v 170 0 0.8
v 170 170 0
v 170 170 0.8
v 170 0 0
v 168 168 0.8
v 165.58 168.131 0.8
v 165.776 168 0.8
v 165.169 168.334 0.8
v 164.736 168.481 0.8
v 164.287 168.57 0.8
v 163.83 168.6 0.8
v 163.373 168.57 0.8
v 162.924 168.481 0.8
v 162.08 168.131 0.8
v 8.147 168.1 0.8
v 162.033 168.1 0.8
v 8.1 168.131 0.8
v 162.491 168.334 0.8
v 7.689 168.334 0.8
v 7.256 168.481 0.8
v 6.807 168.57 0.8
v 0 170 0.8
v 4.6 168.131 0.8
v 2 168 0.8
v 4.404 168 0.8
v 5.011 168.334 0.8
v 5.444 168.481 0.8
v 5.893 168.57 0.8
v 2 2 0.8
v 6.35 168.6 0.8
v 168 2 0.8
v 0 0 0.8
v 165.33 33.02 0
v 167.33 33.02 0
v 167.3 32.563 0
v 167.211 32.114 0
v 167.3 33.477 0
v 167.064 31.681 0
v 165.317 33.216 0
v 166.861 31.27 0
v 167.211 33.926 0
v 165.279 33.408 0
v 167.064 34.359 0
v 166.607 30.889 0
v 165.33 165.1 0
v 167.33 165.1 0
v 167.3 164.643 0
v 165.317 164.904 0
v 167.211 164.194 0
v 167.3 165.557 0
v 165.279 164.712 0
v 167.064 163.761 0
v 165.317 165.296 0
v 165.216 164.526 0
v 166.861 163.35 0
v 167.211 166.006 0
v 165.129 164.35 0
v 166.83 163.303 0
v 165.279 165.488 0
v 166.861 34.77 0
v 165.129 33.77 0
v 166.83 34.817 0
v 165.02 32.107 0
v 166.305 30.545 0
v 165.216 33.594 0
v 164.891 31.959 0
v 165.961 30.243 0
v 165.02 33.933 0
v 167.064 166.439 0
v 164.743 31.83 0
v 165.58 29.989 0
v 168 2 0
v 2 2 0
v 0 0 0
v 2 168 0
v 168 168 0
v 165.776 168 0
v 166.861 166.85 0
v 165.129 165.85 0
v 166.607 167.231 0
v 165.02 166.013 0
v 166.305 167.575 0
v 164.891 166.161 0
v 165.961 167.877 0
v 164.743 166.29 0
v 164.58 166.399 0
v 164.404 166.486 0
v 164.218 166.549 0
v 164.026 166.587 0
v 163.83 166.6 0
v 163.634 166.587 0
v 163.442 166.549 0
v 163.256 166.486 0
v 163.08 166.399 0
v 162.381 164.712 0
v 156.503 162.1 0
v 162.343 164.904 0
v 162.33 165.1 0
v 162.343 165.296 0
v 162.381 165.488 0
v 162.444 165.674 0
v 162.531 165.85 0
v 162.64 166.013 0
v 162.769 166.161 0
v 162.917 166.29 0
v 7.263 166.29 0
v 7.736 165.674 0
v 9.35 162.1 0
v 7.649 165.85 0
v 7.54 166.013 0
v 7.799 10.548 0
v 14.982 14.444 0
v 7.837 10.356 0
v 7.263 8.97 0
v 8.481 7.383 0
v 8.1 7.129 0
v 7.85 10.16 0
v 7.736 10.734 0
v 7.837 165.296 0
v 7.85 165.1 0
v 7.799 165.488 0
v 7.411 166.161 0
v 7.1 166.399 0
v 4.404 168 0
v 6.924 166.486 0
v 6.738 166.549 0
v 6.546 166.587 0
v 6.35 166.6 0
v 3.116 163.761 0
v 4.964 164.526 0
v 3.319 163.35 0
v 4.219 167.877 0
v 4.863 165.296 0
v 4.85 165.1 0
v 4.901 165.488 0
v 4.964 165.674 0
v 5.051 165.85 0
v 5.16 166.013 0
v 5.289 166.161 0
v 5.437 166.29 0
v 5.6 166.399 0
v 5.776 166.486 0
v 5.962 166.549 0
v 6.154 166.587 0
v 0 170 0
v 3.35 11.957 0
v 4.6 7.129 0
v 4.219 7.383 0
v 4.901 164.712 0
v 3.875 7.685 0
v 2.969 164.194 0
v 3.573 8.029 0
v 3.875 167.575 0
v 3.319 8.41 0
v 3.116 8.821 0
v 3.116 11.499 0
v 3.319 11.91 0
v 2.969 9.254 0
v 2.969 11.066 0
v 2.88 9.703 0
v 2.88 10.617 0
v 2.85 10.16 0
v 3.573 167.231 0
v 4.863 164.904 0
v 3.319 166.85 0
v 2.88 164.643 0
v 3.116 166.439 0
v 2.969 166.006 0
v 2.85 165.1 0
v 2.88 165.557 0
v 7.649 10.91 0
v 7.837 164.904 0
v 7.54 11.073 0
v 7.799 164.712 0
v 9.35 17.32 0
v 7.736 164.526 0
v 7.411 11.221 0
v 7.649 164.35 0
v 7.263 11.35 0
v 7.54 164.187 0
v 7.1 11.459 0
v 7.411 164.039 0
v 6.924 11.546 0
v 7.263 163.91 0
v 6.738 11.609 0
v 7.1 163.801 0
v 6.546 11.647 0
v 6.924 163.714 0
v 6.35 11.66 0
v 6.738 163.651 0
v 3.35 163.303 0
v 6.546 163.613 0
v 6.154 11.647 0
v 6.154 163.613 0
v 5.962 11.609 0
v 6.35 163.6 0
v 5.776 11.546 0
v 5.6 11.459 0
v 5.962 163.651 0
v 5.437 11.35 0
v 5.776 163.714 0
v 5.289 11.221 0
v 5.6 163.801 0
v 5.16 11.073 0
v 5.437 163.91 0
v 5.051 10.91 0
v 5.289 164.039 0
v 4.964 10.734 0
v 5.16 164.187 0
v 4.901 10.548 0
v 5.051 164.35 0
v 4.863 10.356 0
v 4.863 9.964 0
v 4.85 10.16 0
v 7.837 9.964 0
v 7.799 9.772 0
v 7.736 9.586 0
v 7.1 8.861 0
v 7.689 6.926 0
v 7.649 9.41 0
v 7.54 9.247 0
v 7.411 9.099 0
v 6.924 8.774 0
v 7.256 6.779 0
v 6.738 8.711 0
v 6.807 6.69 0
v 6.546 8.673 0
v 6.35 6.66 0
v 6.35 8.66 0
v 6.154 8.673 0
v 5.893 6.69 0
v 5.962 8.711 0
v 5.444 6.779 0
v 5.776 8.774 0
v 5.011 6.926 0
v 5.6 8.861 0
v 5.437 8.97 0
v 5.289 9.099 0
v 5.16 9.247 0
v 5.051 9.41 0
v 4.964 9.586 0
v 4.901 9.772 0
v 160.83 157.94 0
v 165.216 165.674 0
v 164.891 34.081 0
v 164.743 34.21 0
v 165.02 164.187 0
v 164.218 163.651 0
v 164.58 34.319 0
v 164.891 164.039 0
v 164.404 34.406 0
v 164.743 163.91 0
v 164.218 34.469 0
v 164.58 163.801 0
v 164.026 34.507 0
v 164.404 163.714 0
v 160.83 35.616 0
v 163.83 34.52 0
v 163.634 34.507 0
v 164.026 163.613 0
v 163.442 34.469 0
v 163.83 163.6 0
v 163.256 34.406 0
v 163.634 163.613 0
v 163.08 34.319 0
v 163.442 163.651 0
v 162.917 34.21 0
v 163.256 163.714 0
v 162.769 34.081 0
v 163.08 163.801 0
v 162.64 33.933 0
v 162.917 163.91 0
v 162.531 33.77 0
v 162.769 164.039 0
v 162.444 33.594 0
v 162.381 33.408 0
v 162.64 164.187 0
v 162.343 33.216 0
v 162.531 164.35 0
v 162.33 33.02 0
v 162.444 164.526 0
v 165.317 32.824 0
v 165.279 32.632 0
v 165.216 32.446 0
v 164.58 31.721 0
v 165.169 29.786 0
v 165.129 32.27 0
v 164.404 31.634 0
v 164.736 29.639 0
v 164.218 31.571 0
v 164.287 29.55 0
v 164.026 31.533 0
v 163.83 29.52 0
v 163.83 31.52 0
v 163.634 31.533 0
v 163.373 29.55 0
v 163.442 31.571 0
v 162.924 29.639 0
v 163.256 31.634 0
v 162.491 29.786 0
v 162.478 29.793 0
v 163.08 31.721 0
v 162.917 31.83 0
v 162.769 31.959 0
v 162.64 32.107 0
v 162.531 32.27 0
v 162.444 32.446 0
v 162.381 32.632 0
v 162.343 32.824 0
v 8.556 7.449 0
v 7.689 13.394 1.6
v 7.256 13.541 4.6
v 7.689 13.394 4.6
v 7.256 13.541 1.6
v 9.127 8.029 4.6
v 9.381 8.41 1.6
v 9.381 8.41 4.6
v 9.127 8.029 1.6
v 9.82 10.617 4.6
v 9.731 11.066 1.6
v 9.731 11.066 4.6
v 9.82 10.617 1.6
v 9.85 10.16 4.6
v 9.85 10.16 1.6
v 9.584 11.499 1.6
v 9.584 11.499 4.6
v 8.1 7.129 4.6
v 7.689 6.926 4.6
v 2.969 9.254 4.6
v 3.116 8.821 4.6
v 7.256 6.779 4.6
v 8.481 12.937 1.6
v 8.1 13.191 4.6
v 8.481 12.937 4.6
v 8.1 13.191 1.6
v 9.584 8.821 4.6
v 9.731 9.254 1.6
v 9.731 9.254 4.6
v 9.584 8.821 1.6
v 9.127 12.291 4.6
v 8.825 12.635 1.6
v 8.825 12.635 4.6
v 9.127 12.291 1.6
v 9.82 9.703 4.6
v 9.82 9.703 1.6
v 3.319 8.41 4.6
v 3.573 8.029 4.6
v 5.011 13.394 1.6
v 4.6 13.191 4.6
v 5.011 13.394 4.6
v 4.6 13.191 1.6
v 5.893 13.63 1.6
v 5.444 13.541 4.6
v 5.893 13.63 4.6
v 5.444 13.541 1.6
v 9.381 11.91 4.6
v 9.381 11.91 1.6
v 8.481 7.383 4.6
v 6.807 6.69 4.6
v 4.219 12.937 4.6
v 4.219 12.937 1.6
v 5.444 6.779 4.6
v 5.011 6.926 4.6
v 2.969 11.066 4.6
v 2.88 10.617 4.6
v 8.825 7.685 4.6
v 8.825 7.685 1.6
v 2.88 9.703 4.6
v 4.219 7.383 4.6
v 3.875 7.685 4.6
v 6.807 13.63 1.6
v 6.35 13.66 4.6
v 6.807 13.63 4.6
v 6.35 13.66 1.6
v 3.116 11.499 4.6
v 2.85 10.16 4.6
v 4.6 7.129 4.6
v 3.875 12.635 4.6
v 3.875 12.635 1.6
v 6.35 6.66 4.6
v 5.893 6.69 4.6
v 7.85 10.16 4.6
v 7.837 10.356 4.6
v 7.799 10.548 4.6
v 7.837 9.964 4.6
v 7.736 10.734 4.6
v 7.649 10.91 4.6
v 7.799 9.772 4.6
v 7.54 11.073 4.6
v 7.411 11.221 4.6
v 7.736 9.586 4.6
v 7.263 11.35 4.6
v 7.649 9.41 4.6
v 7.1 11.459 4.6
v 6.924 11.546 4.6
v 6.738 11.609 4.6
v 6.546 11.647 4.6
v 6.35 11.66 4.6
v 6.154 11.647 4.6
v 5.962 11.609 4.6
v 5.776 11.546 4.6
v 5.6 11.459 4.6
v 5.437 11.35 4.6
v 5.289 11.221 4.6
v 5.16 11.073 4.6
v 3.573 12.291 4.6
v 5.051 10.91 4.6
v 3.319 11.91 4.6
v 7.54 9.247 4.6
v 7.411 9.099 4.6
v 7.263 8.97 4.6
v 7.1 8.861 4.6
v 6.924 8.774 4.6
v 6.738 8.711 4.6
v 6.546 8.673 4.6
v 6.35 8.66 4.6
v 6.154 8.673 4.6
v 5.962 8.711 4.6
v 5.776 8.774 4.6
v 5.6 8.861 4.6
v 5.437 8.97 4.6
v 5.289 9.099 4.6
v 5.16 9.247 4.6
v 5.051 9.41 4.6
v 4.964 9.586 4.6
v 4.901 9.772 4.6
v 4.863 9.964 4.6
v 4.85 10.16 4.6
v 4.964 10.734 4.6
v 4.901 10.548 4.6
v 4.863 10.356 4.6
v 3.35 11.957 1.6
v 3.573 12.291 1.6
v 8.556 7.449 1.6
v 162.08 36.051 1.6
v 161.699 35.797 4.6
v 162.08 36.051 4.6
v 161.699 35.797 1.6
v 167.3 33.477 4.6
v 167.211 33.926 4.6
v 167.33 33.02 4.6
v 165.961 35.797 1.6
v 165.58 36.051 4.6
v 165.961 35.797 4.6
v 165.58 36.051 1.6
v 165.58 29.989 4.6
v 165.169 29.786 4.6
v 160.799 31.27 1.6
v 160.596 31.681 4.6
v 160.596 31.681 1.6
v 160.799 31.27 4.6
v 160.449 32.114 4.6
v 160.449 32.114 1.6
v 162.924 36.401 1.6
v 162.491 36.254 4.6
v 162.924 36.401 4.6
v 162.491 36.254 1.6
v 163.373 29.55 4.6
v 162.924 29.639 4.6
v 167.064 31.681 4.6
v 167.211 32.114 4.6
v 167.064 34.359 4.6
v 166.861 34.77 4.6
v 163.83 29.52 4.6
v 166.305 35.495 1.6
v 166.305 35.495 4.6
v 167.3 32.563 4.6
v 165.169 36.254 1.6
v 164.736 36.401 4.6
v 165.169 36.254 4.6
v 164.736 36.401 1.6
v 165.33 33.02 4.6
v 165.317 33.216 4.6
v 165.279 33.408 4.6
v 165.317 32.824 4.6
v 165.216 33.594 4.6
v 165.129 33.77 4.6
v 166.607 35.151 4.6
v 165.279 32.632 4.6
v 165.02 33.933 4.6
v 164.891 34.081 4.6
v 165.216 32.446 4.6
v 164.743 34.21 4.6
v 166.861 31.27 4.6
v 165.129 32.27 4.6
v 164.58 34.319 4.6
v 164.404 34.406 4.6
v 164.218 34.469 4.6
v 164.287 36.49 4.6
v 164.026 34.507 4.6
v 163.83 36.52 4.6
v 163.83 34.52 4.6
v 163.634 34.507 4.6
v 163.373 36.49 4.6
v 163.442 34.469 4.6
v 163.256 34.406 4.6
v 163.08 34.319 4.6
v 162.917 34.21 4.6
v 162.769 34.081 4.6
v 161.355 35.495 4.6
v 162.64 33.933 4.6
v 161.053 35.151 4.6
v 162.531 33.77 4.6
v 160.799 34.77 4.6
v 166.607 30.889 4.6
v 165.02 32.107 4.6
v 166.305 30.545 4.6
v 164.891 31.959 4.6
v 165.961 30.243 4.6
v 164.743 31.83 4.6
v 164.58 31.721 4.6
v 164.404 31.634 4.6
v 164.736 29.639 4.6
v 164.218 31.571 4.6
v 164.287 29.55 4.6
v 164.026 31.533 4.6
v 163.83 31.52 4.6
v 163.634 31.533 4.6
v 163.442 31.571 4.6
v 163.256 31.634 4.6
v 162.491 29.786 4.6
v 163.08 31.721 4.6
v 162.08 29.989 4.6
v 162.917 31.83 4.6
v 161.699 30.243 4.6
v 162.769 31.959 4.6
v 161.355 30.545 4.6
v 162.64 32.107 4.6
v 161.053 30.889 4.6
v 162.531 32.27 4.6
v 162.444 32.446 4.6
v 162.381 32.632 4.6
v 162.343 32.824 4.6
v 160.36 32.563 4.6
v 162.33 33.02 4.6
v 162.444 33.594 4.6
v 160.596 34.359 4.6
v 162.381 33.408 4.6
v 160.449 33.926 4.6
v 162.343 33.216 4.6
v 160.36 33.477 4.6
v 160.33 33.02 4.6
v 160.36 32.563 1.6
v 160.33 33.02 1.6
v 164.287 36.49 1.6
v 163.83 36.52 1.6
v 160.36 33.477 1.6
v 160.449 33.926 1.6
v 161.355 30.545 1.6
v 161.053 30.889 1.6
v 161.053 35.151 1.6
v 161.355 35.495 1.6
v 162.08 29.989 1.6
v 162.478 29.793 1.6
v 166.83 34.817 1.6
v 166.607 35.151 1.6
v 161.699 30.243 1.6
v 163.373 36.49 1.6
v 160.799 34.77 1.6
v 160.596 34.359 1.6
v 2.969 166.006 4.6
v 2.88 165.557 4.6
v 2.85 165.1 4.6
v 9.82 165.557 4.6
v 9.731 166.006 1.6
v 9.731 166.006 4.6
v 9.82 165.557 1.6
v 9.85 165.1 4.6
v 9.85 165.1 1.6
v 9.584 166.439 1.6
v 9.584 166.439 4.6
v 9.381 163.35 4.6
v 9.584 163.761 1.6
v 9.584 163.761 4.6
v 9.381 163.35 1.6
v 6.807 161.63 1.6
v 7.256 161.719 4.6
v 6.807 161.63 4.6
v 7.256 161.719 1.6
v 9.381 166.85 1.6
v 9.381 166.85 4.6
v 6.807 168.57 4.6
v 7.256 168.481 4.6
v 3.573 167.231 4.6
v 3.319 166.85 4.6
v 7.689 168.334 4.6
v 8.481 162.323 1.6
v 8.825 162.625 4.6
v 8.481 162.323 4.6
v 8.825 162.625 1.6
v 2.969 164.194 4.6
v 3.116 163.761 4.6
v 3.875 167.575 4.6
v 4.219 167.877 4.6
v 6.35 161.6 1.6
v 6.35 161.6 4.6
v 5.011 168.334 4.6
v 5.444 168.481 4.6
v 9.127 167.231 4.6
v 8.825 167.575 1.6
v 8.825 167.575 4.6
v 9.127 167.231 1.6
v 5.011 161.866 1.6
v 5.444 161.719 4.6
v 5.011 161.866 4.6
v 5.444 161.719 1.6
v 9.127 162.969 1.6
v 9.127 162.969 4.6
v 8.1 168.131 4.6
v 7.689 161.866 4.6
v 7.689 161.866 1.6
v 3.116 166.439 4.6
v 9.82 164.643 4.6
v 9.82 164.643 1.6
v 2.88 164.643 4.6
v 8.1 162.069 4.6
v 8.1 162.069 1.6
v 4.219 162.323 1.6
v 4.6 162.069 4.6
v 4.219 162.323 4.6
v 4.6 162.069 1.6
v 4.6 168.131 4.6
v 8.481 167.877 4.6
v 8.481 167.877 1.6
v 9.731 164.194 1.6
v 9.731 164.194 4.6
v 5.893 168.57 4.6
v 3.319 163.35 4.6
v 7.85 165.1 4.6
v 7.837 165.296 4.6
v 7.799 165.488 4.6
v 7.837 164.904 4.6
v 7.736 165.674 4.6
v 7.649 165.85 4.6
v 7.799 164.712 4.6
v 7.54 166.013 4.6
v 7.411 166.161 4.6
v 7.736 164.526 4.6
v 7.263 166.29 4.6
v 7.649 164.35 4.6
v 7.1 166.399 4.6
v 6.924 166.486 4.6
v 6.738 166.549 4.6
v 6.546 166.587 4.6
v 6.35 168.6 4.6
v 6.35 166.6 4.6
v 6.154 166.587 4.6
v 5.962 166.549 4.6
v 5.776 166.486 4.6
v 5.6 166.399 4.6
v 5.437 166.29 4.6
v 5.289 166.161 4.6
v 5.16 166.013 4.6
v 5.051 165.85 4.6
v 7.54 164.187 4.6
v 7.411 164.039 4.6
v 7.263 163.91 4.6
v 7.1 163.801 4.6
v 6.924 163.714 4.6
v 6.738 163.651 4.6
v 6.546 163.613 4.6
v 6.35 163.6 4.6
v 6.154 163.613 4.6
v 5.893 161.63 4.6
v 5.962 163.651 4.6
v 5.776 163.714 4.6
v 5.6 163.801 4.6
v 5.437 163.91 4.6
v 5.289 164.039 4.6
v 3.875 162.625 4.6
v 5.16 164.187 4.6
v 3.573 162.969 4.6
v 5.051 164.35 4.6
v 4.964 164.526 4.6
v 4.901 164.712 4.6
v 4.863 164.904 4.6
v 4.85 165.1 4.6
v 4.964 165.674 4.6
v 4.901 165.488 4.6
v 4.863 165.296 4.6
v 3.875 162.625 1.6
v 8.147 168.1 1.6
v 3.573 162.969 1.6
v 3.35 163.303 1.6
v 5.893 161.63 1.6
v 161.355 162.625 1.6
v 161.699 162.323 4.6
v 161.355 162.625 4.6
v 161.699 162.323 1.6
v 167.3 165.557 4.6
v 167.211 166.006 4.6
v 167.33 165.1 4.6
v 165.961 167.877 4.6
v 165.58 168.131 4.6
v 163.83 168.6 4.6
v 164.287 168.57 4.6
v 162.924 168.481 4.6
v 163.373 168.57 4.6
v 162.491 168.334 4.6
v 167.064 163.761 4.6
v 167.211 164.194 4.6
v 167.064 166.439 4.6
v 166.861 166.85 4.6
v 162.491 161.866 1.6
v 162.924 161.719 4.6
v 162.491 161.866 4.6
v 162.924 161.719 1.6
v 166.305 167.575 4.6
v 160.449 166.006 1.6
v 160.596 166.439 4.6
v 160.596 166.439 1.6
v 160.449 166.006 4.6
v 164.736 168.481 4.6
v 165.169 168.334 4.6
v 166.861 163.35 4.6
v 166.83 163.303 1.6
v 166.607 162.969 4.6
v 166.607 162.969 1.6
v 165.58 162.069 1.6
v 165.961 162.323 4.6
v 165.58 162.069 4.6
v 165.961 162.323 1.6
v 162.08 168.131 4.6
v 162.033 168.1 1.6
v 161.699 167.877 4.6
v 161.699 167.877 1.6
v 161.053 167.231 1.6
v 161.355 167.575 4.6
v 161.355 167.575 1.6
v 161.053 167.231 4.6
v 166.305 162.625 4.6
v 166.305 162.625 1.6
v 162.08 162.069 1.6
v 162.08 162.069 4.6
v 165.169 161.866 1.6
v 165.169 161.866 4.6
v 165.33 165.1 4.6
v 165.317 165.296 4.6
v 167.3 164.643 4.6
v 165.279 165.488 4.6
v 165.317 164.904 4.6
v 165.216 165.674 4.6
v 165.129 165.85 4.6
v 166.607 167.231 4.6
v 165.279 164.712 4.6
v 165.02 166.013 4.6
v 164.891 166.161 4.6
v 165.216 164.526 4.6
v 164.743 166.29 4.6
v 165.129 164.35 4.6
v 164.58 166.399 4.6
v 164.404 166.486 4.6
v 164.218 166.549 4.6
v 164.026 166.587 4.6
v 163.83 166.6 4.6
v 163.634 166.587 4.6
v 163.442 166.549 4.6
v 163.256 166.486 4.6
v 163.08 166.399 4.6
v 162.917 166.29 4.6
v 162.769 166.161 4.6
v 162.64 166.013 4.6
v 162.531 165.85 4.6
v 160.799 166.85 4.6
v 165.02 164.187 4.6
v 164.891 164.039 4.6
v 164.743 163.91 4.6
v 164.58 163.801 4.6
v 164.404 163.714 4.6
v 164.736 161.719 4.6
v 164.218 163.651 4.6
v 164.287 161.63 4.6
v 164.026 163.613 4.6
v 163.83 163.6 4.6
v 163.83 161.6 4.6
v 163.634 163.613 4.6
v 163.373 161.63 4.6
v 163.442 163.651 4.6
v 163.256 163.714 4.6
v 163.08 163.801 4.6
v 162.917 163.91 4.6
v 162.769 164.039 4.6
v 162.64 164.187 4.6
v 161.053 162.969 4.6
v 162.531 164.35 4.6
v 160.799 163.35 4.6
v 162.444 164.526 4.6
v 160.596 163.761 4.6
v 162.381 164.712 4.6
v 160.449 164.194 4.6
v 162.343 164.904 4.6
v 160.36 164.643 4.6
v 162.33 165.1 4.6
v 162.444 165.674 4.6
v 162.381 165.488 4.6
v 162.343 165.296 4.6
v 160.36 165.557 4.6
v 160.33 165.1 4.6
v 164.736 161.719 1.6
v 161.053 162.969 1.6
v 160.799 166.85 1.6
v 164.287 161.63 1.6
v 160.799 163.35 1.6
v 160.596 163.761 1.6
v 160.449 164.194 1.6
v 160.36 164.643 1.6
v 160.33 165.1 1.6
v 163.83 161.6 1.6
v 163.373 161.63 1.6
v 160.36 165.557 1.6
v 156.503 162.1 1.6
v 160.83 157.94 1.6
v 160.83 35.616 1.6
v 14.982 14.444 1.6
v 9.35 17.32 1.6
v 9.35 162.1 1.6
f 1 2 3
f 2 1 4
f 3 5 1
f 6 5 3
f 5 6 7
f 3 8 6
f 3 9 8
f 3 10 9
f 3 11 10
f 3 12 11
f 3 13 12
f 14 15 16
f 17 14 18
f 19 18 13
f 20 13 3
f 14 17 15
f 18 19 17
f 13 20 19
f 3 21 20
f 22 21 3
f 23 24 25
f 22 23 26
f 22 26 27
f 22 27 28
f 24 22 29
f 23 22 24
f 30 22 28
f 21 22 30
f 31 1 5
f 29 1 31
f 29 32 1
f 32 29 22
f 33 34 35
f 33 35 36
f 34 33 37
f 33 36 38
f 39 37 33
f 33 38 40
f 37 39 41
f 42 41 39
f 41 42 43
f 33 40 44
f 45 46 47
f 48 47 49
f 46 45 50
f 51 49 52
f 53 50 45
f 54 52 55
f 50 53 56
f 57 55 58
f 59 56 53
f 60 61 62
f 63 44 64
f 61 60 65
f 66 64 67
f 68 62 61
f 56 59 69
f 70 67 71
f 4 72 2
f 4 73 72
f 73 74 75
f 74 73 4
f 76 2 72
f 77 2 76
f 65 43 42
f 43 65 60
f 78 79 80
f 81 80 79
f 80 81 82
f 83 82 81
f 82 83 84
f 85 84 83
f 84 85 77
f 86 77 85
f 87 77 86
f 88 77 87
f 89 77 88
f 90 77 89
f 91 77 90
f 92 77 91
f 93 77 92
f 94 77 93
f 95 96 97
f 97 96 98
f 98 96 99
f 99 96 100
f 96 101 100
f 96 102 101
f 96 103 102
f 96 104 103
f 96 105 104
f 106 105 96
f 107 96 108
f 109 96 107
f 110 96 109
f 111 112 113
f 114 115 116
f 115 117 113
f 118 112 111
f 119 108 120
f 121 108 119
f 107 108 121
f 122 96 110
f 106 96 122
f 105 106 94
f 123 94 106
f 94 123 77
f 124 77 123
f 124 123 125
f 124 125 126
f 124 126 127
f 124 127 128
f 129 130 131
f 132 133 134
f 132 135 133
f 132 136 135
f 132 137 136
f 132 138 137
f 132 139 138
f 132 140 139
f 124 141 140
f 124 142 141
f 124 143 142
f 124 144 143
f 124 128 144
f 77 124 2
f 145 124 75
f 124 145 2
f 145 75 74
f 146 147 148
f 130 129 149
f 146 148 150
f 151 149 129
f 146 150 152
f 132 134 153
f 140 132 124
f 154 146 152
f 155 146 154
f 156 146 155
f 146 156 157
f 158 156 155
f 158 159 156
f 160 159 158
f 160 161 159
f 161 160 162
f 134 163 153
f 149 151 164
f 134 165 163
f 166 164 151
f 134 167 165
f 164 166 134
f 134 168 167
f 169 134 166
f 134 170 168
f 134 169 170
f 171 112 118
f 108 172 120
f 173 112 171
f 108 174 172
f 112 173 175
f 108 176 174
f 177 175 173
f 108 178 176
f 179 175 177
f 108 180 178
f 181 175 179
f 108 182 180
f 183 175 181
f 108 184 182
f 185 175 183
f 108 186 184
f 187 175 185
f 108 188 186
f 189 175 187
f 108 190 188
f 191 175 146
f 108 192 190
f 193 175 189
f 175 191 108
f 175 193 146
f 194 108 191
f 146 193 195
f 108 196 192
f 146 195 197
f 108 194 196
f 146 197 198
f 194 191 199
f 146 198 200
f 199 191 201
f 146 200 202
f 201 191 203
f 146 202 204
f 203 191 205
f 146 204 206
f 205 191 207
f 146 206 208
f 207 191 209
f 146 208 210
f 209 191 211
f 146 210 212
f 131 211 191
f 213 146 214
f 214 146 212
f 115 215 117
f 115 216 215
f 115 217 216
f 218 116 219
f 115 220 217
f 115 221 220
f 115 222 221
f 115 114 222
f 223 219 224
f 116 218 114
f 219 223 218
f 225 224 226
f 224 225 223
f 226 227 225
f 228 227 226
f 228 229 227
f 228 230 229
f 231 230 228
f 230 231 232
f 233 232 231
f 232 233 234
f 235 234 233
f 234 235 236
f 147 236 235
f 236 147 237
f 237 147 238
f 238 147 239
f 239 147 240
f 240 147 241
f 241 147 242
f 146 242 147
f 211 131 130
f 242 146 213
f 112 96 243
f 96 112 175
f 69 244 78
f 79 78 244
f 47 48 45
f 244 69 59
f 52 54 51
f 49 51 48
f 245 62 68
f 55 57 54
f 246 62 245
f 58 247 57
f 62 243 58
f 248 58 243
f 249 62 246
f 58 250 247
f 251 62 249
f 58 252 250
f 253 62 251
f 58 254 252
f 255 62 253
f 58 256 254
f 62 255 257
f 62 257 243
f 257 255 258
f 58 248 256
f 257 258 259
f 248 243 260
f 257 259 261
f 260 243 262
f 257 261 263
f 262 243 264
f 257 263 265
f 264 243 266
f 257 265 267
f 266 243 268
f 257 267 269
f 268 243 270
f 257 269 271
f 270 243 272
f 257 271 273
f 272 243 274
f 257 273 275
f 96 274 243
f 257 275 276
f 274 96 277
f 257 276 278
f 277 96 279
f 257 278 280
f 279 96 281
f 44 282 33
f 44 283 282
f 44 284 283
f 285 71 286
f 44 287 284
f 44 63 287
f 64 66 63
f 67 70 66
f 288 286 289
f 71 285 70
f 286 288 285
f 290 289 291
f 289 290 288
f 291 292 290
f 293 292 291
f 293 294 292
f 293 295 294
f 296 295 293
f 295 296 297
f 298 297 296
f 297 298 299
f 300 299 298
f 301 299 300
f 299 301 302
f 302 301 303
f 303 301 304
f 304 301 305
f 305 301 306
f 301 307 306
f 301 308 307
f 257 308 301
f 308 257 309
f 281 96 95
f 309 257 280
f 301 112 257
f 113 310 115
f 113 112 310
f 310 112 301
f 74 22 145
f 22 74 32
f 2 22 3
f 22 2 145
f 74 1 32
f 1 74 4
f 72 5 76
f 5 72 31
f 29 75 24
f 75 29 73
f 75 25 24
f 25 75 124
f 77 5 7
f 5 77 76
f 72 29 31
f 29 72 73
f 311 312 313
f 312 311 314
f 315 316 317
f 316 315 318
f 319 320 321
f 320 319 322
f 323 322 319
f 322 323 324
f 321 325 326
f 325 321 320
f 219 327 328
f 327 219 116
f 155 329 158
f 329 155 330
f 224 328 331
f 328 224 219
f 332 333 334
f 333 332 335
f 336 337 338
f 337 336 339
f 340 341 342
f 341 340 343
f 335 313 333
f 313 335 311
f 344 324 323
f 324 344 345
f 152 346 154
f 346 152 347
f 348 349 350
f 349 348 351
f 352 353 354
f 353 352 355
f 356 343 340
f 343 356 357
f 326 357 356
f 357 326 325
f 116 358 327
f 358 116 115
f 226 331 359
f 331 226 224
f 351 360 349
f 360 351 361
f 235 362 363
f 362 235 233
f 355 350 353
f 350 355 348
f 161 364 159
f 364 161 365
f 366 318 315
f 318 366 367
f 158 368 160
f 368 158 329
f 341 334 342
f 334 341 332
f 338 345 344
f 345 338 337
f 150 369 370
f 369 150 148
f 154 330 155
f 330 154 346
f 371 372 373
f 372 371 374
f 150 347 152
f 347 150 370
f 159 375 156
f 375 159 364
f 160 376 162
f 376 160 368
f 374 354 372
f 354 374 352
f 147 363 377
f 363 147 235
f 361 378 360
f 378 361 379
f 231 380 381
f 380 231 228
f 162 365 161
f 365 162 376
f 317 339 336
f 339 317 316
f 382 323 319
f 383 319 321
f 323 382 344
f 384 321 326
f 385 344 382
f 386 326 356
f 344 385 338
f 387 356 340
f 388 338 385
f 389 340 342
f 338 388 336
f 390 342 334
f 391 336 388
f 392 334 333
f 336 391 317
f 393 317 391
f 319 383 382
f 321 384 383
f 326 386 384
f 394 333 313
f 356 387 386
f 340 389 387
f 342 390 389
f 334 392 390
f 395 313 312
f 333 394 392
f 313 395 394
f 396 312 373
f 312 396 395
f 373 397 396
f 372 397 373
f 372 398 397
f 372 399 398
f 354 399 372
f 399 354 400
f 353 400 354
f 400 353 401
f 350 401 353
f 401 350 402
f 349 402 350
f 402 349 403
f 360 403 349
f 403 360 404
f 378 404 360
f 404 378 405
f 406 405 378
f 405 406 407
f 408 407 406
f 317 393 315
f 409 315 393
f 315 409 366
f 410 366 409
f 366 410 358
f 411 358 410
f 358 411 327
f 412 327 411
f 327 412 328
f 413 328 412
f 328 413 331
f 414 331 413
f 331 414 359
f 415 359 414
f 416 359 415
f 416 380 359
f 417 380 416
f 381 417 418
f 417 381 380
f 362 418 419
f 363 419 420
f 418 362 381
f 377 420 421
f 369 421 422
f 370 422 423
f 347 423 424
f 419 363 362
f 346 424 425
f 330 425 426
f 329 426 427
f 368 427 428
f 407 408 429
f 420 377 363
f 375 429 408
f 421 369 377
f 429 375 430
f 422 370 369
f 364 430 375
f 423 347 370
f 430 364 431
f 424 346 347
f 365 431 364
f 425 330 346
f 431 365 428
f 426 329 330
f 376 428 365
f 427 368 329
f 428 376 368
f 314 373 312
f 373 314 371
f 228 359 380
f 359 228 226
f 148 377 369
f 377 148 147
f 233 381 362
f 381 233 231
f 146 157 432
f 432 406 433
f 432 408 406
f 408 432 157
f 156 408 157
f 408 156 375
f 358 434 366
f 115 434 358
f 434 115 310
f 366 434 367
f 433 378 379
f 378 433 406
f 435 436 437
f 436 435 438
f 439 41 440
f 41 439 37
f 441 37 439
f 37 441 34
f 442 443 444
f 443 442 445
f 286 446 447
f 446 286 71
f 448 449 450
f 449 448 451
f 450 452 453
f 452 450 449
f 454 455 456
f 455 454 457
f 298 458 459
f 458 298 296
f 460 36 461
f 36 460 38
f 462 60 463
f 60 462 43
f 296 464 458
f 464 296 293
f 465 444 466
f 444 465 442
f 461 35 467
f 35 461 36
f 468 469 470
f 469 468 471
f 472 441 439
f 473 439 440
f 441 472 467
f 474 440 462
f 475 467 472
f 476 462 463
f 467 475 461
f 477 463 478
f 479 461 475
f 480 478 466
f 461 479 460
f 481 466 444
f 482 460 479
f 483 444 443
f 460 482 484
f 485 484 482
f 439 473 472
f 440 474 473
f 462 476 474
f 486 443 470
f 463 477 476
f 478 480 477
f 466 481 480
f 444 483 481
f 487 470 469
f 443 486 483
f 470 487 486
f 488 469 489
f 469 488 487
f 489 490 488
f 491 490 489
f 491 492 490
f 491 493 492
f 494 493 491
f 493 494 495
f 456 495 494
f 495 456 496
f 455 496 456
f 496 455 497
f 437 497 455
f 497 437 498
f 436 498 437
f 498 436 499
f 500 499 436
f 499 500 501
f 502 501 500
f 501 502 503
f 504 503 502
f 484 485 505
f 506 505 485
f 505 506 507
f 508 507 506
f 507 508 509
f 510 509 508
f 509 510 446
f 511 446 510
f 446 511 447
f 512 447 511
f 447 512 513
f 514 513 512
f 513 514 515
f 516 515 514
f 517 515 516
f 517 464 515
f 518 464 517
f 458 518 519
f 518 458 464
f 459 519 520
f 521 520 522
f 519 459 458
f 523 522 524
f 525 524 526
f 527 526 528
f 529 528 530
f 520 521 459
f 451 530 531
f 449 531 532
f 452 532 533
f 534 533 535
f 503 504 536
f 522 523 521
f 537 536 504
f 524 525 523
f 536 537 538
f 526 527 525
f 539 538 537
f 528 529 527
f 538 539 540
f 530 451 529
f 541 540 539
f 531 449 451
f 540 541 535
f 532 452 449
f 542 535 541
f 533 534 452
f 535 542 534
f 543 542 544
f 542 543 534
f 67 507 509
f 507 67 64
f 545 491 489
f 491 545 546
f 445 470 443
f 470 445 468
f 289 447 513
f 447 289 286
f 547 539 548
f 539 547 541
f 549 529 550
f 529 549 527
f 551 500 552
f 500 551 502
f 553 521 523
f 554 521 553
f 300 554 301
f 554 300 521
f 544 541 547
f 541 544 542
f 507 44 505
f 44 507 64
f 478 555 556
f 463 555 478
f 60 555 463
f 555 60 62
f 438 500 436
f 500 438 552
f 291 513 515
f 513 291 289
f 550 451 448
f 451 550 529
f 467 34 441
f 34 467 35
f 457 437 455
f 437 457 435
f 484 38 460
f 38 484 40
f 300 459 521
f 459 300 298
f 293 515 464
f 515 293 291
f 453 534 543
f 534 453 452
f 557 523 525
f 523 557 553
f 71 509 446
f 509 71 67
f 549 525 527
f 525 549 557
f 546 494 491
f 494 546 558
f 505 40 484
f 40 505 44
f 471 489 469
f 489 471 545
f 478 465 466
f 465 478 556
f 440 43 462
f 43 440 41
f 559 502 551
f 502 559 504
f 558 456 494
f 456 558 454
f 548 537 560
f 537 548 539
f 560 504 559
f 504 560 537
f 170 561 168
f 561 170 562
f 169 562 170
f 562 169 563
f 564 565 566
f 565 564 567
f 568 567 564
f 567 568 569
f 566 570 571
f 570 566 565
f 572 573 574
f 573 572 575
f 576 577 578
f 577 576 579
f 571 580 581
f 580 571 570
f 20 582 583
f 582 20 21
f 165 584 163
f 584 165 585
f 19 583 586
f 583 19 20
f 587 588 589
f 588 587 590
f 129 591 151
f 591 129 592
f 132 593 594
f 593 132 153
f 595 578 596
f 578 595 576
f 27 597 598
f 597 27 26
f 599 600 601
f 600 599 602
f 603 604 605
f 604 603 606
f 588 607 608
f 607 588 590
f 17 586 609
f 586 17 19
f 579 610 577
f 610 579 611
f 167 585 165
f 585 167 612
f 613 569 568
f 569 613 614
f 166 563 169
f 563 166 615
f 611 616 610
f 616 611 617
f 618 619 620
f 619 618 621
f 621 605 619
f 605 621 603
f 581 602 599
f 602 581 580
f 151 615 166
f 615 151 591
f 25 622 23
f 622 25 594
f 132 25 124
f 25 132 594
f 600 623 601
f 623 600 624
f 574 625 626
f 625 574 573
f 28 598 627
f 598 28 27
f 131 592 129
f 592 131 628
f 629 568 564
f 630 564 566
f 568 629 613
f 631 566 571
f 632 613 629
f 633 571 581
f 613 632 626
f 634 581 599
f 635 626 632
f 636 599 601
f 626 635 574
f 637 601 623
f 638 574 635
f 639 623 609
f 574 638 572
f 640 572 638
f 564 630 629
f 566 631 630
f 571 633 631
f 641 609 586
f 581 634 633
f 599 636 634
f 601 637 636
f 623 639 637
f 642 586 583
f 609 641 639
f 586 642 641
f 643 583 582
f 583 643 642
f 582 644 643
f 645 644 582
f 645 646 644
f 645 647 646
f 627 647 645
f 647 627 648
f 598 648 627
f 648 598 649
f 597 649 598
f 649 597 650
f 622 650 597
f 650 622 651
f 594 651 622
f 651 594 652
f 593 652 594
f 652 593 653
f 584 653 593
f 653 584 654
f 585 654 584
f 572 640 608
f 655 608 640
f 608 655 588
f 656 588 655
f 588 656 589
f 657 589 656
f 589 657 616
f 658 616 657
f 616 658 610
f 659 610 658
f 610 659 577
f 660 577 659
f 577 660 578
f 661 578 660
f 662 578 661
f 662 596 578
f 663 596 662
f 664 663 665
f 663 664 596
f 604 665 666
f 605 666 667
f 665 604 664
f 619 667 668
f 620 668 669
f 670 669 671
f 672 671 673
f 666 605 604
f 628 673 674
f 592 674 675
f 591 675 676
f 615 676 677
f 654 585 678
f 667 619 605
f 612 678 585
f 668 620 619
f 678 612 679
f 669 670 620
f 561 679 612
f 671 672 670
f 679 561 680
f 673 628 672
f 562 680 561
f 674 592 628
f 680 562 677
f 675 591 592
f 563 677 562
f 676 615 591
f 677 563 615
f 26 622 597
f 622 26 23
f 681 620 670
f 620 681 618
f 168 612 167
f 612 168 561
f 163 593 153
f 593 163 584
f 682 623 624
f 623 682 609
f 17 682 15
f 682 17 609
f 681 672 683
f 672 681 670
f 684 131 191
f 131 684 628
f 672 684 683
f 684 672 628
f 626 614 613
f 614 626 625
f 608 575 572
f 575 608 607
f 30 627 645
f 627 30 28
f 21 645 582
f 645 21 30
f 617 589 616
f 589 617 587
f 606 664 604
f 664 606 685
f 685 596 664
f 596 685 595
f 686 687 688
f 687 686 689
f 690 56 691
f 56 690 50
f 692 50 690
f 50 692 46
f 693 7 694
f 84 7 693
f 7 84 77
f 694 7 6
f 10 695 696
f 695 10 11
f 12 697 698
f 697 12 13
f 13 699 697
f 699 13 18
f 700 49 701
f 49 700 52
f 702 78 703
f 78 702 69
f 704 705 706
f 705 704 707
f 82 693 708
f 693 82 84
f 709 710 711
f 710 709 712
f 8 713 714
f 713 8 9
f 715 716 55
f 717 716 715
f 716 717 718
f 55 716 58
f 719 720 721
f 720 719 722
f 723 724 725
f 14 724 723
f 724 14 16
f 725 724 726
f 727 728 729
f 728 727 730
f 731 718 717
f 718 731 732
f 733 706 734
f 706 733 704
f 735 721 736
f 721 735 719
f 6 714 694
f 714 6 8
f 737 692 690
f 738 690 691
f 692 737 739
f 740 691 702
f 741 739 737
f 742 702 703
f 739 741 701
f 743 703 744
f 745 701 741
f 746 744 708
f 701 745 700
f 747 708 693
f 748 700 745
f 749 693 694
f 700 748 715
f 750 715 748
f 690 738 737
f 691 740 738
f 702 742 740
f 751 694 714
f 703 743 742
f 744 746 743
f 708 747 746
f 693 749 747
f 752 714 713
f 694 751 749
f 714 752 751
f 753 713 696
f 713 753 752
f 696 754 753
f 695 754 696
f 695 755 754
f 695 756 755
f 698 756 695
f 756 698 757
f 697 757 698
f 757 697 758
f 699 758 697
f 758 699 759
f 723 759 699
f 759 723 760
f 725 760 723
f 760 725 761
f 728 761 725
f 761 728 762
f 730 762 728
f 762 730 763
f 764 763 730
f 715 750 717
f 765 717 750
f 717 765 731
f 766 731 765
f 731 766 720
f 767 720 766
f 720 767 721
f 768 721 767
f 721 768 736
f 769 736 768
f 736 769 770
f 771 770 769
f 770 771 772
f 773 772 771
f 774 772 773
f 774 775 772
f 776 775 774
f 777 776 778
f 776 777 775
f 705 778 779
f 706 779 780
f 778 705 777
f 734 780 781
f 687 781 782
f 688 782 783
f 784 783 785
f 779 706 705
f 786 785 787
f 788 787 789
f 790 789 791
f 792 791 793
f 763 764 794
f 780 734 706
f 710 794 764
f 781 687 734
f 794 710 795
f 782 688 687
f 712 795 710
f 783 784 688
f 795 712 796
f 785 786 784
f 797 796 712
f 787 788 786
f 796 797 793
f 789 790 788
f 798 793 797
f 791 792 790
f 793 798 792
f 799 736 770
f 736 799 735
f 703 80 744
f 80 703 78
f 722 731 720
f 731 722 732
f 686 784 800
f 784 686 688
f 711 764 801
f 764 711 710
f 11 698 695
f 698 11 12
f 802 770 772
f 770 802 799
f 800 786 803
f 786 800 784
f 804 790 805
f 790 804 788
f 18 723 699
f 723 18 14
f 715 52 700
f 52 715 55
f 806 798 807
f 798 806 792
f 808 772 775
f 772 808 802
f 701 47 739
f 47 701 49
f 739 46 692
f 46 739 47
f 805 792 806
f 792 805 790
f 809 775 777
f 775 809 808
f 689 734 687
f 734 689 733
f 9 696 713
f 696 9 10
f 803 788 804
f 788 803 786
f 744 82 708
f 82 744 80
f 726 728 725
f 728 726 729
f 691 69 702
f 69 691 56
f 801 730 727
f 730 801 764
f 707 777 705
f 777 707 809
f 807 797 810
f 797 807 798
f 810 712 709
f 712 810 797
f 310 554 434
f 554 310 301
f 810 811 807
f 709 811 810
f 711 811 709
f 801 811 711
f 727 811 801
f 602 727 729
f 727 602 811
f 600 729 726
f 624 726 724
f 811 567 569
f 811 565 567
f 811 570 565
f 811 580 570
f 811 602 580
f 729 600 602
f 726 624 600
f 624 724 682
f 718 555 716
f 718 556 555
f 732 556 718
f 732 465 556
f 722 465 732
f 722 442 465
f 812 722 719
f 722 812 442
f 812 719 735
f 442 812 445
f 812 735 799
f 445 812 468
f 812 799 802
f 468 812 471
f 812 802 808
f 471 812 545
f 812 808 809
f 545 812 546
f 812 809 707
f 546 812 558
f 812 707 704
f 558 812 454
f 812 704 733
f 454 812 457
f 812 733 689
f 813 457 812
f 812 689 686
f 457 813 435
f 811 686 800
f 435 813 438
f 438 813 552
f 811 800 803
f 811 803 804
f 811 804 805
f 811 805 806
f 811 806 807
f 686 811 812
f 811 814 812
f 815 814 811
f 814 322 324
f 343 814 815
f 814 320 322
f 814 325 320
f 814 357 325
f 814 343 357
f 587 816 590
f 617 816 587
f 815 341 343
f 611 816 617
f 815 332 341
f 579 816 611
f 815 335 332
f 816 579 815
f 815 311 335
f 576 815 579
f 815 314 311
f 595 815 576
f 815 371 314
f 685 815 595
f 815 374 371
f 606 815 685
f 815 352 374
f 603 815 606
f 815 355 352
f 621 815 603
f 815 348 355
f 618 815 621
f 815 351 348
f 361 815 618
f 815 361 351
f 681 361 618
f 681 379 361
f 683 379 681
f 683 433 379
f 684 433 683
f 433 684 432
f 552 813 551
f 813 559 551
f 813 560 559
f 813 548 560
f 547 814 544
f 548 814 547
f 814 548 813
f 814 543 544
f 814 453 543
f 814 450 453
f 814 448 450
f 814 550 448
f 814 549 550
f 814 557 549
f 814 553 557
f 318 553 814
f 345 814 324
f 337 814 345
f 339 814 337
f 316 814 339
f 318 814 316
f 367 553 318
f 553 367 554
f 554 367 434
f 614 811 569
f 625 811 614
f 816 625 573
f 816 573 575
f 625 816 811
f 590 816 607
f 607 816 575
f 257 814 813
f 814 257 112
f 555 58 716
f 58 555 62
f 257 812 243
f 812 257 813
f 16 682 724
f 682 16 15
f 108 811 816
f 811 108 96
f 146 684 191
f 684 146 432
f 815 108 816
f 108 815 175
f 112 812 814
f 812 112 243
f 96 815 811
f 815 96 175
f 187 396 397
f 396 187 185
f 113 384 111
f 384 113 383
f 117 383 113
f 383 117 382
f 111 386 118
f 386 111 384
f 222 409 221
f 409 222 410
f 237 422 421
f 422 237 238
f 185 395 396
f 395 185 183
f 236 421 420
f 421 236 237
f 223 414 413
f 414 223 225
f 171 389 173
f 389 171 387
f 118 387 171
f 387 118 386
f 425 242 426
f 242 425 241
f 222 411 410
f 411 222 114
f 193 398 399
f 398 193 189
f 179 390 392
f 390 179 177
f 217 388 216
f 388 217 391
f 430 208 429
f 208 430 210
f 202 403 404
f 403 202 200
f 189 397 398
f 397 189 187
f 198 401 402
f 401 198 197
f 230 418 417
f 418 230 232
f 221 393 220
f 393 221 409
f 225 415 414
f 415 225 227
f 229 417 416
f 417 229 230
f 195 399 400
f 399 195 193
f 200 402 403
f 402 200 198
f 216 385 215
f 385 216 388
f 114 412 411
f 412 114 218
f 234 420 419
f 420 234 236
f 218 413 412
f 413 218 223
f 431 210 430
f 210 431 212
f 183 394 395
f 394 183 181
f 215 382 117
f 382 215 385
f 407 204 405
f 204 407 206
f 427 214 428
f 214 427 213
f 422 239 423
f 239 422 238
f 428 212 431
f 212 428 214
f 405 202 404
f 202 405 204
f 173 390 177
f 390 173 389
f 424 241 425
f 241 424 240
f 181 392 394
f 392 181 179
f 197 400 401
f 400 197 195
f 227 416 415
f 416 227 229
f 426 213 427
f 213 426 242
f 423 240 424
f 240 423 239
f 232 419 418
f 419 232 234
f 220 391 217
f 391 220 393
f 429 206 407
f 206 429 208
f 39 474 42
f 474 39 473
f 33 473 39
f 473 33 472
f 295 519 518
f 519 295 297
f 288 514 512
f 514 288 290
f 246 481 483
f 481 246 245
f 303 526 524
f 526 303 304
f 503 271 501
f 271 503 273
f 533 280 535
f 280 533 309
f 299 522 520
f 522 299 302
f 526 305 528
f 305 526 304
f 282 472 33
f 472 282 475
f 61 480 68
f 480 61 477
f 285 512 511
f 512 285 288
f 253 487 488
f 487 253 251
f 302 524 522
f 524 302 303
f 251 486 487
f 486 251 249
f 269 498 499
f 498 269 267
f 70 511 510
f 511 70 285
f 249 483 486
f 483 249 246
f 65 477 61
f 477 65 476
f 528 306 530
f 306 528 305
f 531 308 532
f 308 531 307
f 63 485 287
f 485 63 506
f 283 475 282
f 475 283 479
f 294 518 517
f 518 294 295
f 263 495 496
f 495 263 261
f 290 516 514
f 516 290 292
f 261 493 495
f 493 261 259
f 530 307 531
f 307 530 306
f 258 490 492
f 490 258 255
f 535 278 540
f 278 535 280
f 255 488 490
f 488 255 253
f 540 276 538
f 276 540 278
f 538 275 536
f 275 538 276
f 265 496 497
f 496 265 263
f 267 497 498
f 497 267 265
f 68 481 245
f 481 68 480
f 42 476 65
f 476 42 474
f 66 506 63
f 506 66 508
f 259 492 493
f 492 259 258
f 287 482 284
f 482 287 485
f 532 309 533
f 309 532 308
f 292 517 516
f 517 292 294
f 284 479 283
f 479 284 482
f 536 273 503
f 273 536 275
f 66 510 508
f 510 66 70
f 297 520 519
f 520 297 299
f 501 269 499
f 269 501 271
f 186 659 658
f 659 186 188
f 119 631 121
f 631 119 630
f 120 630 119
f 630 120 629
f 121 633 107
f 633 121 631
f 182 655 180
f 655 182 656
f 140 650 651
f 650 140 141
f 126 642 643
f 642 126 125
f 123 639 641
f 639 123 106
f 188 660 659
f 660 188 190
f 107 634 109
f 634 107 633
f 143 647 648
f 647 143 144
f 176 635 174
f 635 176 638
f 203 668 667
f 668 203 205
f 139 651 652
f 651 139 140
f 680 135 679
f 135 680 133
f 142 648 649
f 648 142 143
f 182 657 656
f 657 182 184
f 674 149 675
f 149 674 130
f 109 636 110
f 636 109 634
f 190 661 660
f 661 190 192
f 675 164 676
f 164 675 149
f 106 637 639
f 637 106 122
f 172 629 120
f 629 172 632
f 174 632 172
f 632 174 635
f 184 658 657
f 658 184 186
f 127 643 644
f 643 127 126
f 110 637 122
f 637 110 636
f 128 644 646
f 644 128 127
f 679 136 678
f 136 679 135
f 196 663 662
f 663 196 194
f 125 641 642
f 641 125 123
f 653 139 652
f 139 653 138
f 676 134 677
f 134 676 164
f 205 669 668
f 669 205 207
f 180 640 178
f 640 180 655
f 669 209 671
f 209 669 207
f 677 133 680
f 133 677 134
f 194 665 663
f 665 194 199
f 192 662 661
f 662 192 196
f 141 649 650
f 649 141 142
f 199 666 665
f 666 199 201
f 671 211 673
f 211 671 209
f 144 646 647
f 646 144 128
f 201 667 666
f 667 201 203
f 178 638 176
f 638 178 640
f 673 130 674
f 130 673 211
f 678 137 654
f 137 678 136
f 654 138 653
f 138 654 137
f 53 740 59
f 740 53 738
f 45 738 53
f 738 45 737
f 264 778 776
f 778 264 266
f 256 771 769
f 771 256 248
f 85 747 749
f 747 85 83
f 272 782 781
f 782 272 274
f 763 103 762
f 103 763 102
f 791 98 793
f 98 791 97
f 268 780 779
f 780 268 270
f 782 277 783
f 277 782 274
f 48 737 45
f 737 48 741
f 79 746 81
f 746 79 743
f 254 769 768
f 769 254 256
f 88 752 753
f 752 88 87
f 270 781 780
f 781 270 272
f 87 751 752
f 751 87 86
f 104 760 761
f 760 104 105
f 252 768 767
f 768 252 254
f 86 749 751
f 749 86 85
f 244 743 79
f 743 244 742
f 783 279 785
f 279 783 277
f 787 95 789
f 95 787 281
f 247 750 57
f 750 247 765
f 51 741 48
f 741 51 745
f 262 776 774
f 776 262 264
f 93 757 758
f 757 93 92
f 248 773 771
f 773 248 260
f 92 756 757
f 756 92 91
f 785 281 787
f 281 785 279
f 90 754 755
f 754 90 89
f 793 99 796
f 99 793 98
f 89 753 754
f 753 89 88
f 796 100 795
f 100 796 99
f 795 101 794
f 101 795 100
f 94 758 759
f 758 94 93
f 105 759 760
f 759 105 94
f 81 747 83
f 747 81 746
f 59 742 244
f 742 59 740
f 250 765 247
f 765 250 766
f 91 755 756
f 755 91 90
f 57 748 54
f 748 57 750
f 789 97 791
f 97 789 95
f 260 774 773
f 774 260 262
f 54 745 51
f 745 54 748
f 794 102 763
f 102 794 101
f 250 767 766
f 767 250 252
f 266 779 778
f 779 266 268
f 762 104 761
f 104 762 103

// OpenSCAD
// Plantilla de prueba: agujeros mini-ITX estándar (C, F, H, J) para la placa del HP 260-a110ns
// Versión fina: barras 6 mm x 1,6 mm, separadores 3 mm (solo para comprobar agujeros).
// Coordenadas desde la esquina trasera izquierda de la placa (borde I/O = y 0). NO medido en la placa real.
$fn = 48;
mitx = 170; e = 1.6; ancho = 6;
sep_h = 3; sep_d = 7; ag_d = 3.0;
C = [6.35, 10.16];
F = [6.35 + 157.48, 10.16 + 22.86];
H = [6.35, 10.16 + 154.94];
J = [6.35 + 157.48, 10.16 + 154.94];
P = [C, F, H, J];
module barra(a, b) { hull() { translate(a) cylinder(d = ancho, h = e); translate(b) cylinder(d = ancho, h = e); } }
difference() {
  union() {
    // contorno de la placa (marco fino) para ver si coincide con los bordes
    difference() { cube([mitx, mitx, 0.8]); translate([2, 2, -1]) cube([mitx - 4, mitx - 4, 4]); }
    barra(C, F); barra(F, J); barra(J, H); barra(H, C); barra(C, J);
    for (p = P) translate(p) cylinder(d = sep_d, h = e + sep_h);
  }
  for (p = P) translate([p[0], p[1], -1]) cylinder(d = ag_d, h = 20);
  // marca "IO" en el borde trasero
  // (sin texto en la versión fina)
}
